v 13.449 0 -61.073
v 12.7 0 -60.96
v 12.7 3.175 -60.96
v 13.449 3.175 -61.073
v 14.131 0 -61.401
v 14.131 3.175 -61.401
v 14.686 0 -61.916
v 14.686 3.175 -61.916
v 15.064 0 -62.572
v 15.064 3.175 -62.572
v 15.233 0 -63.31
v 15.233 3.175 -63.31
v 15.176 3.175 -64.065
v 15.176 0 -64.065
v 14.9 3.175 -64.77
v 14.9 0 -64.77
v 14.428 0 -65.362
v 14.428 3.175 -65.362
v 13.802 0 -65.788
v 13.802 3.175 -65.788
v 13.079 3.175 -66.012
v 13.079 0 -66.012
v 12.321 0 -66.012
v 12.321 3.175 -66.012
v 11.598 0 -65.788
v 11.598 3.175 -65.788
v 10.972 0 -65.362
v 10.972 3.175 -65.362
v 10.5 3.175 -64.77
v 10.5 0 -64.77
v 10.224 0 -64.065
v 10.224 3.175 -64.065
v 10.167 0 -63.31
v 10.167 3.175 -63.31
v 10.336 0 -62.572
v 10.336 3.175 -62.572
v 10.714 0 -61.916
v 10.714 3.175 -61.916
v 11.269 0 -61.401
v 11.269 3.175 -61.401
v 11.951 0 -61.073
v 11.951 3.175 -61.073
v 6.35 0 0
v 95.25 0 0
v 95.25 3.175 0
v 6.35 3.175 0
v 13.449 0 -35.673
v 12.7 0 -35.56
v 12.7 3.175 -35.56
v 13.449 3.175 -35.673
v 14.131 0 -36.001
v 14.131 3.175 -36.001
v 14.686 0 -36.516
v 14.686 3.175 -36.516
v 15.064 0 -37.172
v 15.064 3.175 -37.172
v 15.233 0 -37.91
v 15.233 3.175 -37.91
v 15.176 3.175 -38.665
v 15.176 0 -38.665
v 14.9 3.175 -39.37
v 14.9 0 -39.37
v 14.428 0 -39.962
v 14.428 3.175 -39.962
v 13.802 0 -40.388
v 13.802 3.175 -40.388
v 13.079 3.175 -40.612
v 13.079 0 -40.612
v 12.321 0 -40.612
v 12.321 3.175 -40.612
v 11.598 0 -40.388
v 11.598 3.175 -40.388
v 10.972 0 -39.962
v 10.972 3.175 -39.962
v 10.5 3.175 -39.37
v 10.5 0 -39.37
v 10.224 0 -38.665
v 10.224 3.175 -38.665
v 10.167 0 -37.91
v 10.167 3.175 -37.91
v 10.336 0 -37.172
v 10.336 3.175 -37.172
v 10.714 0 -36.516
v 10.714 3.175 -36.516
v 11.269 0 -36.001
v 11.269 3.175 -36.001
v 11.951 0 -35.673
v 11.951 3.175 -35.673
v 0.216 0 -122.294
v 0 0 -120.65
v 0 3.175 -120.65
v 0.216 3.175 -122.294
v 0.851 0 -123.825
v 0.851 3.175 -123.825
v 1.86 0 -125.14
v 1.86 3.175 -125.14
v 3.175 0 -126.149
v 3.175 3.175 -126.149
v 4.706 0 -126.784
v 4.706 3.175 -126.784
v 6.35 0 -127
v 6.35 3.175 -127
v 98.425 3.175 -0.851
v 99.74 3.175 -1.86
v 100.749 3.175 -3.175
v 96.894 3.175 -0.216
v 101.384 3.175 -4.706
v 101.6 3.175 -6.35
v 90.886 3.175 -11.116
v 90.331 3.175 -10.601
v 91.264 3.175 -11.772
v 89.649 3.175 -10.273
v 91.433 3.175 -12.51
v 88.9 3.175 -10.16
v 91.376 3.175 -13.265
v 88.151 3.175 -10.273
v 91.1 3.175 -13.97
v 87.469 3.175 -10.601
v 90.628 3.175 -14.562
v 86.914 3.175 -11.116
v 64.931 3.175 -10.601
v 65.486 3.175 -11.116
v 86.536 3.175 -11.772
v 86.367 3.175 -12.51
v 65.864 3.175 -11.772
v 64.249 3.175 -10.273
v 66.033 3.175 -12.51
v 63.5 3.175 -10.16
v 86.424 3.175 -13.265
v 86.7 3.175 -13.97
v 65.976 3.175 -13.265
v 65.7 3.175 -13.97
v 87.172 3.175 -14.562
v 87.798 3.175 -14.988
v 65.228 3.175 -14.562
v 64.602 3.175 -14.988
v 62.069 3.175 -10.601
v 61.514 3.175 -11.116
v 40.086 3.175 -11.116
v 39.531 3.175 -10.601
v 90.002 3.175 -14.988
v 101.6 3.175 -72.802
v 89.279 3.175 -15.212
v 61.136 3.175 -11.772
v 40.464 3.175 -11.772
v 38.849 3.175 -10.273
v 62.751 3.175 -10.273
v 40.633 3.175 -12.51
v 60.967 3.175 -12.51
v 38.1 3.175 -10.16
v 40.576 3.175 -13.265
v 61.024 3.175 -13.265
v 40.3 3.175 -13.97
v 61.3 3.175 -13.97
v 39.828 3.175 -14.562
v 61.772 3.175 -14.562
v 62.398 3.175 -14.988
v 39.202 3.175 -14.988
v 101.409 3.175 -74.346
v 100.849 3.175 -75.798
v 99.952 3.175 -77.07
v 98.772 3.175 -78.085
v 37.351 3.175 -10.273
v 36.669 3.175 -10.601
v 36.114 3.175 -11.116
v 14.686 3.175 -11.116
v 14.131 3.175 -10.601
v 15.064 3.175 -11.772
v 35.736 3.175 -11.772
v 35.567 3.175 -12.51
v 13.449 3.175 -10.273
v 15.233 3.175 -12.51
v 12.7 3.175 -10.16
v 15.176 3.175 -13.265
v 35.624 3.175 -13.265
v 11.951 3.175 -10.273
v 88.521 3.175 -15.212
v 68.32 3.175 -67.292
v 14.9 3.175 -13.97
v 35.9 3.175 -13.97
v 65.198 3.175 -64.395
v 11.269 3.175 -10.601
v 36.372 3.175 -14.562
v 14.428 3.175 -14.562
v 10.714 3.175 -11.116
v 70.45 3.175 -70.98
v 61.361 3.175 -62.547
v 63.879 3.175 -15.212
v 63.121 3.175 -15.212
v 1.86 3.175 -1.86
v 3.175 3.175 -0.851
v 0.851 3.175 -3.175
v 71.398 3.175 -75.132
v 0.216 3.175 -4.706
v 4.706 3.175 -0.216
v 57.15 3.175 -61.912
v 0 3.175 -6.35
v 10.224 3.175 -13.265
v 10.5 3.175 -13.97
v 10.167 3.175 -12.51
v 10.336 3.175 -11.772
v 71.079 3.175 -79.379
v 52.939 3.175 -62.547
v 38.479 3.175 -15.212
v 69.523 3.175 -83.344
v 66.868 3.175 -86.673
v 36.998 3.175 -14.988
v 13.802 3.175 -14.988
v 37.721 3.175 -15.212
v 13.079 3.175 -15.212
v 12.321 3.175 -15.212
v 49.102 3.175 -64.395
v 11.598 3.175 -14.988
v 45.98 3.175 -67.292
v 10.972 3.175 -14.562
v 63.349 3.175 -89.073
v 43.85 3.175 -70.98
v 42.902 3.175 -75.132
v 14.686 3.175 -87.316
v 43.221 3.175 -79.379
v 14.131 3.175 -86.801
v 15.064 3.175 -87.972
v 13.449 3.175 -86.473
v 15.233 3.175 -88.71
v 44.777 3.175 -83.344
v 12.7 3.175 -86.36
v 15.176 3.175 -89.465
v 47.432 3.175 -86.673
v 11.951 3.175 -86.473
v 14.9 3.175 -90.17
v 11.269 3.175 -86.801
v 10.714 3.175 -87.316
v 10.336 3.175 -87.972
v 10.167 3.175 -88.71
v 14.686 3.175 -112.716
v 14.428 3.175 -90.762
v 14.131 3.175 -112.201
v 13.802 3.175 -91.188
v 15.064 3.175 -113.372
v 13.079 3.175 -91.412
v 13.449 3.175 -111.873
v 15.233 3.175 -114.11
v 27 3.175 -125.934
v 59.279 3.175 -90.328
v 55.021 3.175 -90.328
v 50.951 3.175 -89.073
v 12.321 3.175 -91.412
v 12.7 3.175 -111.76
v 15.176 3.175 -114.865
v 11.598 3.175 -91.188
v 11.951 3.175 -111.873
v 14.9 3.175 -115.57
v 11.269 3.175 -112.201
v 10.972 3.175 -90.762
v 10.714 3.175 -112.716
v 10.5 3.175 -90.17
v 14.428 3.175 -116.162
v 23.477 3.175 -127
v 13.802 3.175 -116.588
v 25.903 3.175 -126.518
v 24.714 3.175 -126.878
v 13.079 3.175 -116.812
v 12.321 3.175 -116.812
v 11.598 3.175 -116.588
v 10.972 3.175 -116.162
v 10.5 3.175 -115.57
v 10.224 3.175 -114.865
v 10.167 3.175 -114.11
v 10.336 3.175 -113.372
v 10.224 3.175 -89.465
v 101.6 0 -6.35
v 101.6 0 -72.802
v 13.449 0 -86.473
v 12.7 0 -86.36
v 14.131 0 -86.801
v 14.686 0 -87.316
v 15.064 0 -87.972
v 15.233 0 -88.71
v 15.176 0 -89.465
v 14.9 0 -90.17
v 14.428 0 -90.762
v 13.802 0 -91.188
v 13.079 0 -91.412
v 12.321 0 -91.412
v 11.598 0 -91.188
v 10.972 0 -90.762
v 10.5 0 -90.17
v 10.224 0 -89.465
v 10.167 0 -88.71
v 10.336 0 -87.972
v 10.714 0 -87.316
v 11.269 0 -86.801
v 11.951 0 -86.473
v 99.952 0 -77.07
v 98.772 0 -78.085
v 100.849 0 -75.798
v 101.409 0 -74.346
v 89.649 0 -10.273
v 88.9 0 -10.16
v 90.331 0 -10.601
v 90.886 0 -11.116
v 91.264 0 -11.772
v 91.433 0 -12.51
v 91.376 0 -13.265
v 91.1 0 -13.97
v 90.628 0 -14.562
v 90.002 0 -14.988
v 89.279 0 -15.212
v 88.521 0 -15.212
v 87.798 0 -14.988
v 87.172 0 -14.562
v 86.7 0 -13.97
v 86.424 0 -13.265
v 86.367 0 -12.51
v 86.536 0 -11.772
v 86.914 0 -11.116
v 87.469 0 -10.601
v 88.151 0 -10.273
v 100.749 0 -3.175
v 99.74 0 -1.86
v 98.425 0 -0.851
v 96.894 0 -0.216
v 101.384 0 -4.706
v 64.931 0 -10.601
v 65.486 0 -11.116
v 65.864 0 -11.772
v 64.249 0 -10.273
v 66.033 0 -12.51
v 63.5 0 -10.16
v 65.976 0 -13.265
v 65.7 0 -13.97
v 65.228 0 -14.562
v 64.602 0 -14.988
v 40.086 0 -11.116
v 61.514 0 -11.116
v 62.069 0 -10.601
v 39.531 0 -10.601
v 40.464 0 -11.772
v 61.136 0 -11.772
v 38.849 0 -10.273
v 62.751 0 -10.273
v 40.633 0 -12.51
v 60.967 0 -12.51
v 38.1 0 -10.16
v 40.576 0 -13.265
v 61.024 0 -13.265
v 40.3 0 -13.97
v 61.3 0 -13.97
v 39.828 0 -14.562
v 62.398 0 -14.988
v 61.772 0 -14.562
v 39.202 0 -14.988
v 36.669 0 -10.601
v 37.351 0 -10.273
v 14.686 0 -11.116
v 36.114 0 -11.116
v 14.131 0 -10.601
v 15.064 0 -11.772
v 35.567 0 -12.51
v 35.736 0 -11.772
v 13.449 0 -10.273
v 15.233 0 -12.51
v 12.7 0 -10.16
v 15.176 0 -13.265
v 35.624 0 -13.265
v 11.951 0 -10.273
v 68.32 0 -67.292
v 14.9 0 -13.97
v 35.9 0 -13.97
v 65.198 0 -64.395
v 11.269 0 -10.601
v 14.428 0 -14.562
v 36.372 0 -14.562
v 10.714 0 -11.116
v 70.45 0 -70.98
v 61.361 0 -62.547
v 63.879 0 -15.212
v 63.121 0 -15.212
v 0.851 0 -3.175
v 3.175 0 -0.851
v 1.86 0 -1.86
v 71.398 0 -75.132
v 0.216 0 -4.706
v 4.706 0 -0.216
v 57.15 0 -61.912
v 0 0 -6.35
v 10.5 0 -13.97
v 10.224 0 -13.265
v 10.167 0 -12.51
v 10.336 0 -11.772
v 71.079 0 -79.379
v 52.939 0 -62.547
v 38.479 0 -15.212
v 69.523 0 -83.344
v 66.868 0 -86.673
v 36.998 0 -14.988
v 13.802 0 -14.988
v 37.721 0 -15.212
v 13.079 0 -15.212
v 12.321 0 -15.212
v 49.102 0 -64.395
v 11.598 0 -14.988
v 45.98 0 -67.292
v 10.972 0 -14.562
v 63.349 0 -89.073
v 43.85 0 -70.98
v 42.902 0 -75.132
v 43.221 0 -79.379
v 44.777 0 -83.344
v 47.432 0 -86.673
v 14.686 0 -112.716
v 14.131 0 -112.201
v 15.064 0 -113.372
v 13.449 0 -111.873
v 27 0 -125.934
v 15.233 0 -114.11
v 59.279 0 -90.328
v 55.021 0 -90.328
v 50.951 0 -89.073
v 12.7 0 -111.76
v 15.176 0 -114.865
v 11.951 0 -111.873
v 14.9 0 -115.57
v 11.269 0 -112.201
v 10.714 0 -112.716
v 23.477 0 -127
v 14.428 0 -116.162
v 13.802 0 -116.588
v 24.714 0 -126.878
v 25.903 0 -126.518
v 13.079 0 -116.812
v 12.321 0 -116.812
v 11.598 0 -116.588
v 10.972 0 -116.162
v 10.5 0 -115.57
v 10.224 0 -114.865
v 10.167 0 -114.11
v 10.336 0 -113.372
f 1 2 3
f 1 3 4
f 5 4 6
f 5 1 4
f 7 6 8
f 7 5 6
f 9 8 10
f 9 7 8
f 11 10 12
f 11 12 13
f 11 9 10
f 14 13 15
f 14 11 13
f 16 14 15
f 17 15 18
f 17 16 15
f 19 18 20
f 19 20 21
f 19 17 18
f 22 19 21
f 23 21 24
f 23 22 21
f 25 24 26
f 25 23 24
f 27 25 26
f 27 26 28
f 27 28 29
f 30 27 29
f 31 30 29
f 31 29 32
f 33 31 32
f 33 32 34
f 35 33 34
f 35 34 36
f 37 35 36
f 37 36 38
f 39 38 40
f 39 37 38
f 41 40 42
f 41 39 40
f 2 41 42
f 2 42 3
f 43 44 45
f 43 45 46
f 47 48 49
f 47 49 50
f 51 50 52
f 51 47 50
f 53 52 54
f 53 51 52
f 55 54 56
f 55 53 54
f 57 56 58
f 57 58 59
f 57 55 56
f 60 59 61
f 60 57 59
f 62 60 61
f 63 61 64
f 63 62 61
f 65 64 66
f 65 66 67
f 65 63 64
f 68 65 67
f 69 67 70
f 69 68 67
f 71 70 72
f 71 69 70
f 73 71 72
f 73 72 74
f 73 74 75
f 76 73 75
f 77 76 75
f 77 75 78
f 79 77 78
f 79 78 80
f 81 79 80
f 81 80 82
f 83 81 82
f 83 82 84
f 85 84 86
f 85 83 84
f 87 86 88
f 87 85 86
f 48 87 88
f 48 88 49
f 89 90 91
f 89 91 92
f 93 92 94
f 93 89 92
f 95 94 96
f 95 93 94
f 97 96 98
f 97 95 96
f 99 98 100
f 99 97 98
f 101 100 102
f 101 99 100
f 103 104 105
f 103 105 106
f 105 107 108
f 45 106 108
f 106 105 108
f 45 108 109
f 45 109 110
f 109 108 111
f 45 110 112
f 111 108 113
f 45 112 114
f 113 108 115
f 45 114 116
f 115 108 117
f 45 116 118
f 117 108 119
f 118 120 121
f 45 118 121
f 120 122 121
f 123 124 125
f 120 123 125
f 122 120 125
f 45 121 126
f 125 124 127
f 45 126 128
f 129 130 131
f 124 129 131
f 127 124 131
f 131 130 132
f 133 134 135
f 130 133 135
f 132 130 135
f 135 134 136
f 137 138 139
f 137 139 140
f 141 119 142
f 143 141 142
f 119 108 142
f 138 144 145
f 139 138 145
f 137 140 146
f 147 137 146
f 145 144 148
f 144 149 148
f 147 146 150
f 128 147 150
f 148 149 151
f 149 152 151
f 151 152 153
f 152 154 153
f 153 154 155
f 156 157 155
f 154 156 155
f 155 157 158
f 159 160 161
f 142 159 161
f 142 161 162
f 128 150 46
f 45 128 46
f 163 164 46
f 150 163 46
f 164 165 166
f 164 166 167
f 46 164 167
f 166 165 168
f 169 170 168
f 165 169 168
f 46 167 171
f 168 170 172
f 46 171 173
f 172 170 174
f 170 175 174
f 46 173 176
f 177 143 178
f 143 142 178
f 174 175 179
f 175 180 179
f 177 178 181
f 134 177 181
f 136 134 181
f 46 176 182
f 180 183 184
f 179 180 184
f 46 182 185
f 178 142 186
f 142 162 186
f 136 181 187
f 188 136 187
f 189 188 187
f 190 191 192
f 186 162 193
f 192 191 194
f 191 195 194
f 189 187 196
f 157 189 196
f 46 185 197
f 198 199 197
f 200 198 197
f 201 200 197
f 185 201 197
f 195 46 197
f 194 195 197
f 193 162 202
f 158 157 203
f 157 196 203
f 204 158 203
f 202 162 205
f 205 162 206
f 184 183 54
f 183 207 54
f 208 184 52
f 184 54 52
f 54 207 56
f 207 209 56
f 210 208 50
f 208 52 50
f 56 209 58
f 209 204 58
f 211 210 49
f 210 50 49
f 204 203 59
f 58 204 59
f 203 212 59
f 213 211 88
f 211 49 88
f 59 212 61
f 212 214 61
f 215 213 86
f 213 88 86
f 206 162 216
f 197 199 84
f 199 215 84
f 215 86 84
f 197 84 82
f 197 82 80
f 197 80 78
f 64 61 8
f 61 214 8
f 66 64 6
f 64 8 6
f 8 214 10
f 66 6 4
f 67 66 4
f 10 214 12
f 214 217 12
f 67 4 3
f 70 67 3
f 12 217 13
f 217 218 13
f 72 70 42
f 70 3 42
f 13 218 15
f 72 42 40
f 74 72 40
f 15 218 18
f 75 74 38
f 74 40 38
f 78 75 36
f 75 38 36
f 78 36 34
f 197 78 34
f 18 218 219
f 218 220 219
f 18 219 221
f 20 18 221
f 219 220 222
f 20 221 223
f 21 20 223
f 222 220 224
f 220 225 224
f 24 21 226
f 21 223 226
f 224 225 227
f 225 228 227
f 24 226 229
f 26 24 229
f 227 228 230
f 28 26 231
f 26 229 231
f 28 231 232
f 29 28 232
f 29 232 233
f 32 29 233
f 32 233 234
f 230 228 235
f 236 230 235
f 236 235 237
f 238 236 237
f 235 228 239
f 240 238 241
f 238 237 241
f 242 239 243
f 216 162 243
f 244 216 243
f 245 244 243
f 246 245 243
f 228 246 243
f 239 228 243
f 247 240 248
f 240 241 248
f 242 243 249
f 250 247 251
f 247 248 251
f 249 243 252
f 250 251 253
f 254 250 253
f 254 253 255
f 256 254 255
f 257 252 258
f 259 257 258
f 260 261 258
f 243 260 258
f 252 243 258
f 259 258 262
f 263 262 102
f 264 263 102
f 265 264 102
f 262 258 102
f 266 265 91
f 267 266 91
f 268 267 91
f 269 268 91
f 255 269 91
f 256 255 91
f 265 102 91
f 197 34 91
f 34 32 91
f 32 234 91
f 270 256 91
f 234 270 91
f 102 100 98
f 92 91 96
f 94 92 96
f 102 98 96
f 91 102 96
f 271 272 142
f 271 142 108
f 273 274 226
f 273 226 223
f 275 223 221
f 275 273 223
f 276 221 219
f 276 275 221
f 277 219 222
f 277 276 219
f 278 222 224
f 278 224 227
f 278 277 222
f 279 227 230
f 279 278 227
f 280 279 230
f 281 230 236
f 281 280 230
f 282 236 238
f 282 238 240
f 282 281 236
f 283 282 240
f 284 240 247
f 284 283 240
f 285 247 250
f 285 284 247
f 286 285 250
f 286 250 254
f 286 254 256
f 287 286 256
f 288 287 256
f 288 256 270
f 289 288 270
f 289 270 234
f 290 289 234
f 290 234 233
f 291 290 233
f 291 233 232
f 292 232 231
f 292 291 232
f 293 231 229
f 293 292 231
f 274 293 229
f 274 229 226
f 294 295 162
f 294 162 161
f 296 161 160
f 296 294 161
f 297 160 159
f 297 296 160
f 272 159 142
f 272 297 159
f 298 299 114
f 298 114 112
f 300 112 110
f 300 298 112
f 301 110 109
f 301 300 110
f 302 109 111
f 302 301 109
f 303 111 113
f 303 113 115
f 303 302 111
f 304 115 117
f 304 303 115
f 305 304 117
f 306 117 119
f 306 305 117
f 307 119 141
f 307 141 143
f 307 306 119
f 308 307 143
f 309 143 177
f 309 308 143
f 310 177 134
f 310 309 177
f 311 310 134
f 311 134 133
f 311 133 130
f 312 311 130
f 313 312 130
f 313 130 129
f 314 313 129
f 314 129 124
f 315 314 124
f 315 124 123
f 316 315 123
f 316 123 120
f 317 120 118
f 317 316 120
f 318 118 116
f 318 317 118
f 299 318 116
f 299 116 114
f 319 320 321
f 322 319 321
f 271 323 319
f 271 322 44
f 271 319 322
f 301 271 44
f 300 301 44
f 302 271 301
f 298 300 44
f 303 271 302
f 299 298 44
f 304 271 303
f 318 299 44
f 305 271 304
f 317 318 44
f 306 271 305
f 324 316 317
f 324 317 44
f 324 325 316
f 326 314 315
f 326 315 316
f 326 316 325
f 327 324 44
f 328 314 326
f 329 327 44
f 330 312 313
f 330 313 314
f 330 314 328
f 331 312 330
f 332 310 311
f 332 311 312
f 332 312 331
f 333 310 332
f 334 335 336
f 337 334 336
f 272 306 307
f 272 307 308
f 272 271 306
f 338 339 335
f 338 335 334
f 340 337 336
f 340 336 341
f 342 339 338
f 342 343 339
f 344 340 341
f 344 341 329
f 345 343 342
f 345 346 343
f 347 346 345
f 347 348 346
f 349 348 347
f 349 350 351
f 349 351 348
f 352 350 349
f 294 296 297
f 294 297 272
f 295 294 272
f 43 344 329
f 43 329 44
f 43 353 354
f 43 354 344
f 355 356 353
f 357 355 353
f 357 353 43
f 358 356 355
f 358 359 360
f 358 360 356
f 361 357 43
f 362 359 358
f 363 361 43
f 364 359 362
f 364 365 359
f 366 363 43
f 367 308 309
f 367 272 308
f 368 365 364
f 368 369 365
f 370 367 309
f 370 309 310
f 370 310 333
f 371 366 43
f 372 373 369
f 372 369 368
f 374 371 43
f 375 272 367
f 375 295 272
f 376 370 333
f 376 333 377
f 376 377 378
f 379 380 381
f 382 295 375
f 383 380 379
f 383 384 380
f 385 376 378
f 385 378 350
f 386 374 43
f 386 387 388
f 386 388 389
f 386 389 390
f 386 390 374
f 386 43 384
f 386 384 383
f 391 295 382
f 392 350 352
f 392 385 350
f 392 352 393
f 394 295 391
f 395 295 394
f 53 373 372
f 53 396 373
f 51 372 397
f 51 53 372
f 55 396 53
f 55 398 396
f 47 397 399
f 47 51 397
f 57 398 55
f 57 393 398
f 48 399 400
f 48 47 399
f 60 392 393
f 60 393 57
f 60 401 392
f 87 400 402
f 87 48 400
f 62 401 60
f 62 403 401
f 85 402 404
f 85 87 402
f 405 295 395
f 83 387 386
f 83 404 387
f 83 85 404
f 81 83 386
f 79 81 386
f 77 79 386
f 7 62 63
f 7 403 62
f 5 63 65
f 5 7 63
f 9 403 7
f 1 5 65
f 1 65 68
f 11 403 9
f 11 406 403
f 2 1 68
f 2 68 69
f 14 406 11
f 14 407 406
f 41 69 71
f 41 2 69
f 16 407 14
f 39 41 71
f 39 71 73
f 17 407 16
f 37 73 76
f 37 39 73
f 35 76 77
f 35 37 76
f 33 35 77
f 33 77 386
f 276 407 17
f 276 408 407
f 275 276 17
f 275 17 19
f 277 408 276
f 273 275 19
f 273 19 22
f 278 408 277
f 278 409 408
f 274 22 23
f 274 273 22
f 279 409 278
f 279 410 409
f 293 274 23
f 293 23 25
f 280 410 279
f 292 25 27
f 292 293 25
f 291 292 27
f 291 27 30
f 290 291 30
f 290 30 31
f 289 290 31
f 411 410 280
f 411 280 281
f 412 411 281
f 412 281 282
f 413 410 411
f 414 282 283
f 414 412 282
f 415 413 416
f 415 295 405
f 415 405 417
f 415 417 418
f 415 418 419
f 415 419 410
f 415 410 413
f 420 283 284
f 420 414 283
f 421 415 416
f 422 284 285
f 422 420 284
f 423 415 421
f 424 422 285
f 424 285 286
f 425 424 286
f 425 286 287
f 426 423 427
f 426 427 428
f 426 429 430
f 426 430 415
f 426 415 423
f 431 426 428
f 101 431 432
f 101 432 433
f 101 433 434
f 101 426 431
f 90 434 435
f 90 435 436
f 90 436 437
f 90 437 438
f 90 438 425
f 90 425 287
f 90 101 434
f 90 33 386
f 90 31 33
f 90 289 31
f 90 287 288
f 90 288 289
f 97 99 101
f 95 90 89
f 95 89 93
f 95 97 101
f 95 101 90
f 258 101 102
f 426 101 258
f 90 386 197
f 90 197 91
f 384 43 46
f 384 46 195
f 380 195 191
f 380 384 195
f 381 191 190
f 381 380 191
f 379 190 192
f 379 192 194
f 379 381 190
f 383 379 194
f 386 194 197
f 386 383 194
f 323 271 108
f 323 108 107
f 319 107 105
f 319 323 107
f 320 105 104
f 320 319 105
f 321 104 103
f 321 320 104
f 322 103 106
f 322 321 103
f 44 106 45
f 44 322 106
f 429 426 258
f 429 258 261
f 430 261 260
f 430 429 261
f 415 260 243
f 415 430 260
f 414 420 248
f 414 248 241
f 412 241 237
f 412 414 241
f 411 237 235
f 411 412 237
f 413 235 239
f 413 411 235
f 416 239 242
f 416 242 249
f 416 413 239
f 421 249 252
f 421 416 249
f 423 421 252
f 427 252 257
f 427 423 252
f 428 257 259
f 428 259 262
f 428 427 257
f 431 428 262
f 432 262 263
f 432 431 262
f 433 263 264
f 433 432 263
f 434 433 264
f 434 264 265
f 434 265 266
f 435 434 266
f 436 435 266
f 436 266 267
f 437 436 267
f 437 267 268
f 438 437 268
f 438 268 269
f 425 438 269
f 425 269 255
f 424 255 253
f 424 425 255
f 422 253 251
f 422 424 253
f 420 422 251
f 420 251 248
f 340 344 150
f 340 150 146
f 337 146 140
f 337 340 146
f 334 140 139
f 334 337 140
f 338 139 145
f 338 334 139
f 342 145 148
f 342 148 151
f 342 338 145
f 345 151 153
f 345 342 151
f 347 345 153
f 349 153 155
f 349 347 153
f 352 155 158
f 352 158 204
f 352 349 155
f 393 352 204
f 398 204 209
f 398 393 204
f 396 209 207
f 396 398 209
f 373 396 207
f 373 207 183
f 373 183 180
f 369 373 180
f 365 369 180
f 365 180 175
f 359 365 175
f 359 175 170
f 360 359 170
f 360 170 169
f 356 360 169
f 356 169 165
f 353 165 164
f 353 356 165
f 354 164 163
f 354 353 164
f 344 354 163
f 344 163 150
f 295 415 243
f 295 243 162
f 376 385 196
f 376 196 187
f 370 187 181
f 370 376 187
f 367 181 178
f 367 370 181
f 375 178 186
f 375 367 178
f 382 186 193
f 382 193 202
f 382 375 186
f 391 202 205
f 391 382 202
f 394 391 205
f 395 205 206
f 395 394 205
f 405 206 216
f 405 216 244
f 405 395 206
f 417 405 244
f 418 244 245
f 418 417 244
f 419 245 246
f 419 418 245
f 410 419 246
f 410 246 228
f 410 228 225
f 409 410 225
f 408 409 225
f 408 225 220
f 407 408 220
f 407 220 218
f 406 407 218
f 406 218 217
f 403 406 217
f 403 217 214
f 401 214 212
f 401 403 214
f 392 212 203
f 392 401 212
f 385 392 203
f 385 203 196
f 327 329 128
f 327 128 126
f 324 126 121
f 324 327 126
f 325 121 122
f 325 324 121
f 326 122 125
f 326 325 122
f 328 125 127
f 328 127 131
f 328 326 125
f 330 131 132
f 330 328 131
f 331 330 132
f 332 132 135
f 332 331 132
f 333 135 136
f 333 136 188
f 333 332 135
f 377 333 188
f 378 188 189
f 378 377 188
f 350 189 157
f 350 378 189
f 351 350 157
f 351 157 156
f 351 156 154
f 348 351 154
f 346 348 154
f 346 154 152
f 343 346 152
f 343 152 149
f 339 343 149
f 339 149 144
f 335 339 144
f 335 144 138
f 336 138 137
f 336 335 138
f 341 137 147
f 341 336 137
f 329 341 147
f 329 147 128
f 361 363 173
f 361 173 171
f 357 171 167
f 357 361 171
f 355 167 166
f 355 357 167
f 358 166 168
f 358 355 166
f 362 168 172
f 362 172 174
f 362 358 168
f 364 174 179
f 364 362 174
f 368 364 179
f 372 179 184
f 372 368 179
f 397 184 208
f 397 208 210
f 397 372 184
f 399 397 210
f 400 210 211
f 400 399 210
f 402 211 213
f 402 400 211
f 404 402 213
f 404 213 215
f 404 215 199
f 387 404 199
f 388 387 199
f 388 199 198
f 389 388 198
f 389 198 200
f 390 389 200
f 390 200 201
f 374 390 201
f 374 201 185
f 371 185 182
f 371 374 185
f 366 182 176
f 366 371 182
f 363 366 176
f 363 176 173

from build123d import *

# Parameters (mm, degrees)
SKETCH1_R           = 2.54
SKETCH1_R_2         = 14.2875
BOSS_EXTRUDE1_DEPTH = 3.175


with BuildPart() as part:
    # Sketch1 → Boss-Extrude1 (new body)
    with BuildSketch(Plane(origin=(0, 0, 0), x_dir=(1, 0, 0), z_dir=(0, 1, 0))):
        with BuildLine():
            Line((0, 6.35), (0, 120.65))
            ThreePointArc((0, 120.65), (1.859871939, 125.140128061), (6.35, 127))
            Line((6.35, 127), (23.4773747, 127))
            ThreePointArc((23.4773747, 127), (25.317504045, 126.727534368), (26.999720946, 125.933519369))
            Line((26.999720946, 125.933519369), (98.772346246, 78.085102503))
            ThreePointArc((98.772346246, 78.085102503), (100.848633702, 75.797880961), (101.6, 72.801583134))
            Line((101.6, 72.801583134), (101.6, 6.35))
            ThreePointArc((101.6, 6.35), (99.740128061, 1.859871939), (95.25, 0))
            Line((95.25, 0), (6.35, 0))
            ThreePointArc((6.35, 0), (1.859871939, 1.859871939), (0, 6.35))
        make_face()
        with Locations(Location((88.9, 12.7, 0), (0, 0, 270))):
            Circle(SKETCH1_R, mode=Mode.SUBTRACT)
        with Locations(Location((63.5, 12.7, 0), (0, 0, 270))):
            Circle(SKETCH1_R, mode=Mode.SUBTRACT)
        with Locations(Location((38.1, 12.7, 0), (0, 0, 270))):
            Circle(SKETCH1_R, mode=Mode.SUBTRACT)
        with Locations(Location((12.7, 12.7, 0), (0, 0, 270))):
            Circle(SKETCH1_R, mode=Mode.SUBTRACT)
        with Locations(Location((12.7, 38.1, 0), (0, 0, 270))):
            Circle(SKETCH1_R, mode=Mode.SUBTRACT)
        with Locations(Location((12.7, 63.5, 0), (0, 0, 270))):
            Circle(SKETCH1_R, mode=Mode.SUBTRACT)
        with Locations(Location((12.7, 88.9, 0), (0, 0, 270))):
            Circle(SKETCH1_R, mode=Mode.SUBTRACT)
        with Locations(Location((12.7, 114.3, 0), (0, 0, 270))):
            Circle(SKETCH1_R, mode=Mode.SUBTRACT)
        with Locations(Location((57.15, 76.2, 0), (0, 0, 270))):
            Circle(SKETCH1_R_2, mode=Mode.SUBTRACT)
    extrude(amount=BOSS_EXTRUDE1_DEPTH)


solid = part.part
